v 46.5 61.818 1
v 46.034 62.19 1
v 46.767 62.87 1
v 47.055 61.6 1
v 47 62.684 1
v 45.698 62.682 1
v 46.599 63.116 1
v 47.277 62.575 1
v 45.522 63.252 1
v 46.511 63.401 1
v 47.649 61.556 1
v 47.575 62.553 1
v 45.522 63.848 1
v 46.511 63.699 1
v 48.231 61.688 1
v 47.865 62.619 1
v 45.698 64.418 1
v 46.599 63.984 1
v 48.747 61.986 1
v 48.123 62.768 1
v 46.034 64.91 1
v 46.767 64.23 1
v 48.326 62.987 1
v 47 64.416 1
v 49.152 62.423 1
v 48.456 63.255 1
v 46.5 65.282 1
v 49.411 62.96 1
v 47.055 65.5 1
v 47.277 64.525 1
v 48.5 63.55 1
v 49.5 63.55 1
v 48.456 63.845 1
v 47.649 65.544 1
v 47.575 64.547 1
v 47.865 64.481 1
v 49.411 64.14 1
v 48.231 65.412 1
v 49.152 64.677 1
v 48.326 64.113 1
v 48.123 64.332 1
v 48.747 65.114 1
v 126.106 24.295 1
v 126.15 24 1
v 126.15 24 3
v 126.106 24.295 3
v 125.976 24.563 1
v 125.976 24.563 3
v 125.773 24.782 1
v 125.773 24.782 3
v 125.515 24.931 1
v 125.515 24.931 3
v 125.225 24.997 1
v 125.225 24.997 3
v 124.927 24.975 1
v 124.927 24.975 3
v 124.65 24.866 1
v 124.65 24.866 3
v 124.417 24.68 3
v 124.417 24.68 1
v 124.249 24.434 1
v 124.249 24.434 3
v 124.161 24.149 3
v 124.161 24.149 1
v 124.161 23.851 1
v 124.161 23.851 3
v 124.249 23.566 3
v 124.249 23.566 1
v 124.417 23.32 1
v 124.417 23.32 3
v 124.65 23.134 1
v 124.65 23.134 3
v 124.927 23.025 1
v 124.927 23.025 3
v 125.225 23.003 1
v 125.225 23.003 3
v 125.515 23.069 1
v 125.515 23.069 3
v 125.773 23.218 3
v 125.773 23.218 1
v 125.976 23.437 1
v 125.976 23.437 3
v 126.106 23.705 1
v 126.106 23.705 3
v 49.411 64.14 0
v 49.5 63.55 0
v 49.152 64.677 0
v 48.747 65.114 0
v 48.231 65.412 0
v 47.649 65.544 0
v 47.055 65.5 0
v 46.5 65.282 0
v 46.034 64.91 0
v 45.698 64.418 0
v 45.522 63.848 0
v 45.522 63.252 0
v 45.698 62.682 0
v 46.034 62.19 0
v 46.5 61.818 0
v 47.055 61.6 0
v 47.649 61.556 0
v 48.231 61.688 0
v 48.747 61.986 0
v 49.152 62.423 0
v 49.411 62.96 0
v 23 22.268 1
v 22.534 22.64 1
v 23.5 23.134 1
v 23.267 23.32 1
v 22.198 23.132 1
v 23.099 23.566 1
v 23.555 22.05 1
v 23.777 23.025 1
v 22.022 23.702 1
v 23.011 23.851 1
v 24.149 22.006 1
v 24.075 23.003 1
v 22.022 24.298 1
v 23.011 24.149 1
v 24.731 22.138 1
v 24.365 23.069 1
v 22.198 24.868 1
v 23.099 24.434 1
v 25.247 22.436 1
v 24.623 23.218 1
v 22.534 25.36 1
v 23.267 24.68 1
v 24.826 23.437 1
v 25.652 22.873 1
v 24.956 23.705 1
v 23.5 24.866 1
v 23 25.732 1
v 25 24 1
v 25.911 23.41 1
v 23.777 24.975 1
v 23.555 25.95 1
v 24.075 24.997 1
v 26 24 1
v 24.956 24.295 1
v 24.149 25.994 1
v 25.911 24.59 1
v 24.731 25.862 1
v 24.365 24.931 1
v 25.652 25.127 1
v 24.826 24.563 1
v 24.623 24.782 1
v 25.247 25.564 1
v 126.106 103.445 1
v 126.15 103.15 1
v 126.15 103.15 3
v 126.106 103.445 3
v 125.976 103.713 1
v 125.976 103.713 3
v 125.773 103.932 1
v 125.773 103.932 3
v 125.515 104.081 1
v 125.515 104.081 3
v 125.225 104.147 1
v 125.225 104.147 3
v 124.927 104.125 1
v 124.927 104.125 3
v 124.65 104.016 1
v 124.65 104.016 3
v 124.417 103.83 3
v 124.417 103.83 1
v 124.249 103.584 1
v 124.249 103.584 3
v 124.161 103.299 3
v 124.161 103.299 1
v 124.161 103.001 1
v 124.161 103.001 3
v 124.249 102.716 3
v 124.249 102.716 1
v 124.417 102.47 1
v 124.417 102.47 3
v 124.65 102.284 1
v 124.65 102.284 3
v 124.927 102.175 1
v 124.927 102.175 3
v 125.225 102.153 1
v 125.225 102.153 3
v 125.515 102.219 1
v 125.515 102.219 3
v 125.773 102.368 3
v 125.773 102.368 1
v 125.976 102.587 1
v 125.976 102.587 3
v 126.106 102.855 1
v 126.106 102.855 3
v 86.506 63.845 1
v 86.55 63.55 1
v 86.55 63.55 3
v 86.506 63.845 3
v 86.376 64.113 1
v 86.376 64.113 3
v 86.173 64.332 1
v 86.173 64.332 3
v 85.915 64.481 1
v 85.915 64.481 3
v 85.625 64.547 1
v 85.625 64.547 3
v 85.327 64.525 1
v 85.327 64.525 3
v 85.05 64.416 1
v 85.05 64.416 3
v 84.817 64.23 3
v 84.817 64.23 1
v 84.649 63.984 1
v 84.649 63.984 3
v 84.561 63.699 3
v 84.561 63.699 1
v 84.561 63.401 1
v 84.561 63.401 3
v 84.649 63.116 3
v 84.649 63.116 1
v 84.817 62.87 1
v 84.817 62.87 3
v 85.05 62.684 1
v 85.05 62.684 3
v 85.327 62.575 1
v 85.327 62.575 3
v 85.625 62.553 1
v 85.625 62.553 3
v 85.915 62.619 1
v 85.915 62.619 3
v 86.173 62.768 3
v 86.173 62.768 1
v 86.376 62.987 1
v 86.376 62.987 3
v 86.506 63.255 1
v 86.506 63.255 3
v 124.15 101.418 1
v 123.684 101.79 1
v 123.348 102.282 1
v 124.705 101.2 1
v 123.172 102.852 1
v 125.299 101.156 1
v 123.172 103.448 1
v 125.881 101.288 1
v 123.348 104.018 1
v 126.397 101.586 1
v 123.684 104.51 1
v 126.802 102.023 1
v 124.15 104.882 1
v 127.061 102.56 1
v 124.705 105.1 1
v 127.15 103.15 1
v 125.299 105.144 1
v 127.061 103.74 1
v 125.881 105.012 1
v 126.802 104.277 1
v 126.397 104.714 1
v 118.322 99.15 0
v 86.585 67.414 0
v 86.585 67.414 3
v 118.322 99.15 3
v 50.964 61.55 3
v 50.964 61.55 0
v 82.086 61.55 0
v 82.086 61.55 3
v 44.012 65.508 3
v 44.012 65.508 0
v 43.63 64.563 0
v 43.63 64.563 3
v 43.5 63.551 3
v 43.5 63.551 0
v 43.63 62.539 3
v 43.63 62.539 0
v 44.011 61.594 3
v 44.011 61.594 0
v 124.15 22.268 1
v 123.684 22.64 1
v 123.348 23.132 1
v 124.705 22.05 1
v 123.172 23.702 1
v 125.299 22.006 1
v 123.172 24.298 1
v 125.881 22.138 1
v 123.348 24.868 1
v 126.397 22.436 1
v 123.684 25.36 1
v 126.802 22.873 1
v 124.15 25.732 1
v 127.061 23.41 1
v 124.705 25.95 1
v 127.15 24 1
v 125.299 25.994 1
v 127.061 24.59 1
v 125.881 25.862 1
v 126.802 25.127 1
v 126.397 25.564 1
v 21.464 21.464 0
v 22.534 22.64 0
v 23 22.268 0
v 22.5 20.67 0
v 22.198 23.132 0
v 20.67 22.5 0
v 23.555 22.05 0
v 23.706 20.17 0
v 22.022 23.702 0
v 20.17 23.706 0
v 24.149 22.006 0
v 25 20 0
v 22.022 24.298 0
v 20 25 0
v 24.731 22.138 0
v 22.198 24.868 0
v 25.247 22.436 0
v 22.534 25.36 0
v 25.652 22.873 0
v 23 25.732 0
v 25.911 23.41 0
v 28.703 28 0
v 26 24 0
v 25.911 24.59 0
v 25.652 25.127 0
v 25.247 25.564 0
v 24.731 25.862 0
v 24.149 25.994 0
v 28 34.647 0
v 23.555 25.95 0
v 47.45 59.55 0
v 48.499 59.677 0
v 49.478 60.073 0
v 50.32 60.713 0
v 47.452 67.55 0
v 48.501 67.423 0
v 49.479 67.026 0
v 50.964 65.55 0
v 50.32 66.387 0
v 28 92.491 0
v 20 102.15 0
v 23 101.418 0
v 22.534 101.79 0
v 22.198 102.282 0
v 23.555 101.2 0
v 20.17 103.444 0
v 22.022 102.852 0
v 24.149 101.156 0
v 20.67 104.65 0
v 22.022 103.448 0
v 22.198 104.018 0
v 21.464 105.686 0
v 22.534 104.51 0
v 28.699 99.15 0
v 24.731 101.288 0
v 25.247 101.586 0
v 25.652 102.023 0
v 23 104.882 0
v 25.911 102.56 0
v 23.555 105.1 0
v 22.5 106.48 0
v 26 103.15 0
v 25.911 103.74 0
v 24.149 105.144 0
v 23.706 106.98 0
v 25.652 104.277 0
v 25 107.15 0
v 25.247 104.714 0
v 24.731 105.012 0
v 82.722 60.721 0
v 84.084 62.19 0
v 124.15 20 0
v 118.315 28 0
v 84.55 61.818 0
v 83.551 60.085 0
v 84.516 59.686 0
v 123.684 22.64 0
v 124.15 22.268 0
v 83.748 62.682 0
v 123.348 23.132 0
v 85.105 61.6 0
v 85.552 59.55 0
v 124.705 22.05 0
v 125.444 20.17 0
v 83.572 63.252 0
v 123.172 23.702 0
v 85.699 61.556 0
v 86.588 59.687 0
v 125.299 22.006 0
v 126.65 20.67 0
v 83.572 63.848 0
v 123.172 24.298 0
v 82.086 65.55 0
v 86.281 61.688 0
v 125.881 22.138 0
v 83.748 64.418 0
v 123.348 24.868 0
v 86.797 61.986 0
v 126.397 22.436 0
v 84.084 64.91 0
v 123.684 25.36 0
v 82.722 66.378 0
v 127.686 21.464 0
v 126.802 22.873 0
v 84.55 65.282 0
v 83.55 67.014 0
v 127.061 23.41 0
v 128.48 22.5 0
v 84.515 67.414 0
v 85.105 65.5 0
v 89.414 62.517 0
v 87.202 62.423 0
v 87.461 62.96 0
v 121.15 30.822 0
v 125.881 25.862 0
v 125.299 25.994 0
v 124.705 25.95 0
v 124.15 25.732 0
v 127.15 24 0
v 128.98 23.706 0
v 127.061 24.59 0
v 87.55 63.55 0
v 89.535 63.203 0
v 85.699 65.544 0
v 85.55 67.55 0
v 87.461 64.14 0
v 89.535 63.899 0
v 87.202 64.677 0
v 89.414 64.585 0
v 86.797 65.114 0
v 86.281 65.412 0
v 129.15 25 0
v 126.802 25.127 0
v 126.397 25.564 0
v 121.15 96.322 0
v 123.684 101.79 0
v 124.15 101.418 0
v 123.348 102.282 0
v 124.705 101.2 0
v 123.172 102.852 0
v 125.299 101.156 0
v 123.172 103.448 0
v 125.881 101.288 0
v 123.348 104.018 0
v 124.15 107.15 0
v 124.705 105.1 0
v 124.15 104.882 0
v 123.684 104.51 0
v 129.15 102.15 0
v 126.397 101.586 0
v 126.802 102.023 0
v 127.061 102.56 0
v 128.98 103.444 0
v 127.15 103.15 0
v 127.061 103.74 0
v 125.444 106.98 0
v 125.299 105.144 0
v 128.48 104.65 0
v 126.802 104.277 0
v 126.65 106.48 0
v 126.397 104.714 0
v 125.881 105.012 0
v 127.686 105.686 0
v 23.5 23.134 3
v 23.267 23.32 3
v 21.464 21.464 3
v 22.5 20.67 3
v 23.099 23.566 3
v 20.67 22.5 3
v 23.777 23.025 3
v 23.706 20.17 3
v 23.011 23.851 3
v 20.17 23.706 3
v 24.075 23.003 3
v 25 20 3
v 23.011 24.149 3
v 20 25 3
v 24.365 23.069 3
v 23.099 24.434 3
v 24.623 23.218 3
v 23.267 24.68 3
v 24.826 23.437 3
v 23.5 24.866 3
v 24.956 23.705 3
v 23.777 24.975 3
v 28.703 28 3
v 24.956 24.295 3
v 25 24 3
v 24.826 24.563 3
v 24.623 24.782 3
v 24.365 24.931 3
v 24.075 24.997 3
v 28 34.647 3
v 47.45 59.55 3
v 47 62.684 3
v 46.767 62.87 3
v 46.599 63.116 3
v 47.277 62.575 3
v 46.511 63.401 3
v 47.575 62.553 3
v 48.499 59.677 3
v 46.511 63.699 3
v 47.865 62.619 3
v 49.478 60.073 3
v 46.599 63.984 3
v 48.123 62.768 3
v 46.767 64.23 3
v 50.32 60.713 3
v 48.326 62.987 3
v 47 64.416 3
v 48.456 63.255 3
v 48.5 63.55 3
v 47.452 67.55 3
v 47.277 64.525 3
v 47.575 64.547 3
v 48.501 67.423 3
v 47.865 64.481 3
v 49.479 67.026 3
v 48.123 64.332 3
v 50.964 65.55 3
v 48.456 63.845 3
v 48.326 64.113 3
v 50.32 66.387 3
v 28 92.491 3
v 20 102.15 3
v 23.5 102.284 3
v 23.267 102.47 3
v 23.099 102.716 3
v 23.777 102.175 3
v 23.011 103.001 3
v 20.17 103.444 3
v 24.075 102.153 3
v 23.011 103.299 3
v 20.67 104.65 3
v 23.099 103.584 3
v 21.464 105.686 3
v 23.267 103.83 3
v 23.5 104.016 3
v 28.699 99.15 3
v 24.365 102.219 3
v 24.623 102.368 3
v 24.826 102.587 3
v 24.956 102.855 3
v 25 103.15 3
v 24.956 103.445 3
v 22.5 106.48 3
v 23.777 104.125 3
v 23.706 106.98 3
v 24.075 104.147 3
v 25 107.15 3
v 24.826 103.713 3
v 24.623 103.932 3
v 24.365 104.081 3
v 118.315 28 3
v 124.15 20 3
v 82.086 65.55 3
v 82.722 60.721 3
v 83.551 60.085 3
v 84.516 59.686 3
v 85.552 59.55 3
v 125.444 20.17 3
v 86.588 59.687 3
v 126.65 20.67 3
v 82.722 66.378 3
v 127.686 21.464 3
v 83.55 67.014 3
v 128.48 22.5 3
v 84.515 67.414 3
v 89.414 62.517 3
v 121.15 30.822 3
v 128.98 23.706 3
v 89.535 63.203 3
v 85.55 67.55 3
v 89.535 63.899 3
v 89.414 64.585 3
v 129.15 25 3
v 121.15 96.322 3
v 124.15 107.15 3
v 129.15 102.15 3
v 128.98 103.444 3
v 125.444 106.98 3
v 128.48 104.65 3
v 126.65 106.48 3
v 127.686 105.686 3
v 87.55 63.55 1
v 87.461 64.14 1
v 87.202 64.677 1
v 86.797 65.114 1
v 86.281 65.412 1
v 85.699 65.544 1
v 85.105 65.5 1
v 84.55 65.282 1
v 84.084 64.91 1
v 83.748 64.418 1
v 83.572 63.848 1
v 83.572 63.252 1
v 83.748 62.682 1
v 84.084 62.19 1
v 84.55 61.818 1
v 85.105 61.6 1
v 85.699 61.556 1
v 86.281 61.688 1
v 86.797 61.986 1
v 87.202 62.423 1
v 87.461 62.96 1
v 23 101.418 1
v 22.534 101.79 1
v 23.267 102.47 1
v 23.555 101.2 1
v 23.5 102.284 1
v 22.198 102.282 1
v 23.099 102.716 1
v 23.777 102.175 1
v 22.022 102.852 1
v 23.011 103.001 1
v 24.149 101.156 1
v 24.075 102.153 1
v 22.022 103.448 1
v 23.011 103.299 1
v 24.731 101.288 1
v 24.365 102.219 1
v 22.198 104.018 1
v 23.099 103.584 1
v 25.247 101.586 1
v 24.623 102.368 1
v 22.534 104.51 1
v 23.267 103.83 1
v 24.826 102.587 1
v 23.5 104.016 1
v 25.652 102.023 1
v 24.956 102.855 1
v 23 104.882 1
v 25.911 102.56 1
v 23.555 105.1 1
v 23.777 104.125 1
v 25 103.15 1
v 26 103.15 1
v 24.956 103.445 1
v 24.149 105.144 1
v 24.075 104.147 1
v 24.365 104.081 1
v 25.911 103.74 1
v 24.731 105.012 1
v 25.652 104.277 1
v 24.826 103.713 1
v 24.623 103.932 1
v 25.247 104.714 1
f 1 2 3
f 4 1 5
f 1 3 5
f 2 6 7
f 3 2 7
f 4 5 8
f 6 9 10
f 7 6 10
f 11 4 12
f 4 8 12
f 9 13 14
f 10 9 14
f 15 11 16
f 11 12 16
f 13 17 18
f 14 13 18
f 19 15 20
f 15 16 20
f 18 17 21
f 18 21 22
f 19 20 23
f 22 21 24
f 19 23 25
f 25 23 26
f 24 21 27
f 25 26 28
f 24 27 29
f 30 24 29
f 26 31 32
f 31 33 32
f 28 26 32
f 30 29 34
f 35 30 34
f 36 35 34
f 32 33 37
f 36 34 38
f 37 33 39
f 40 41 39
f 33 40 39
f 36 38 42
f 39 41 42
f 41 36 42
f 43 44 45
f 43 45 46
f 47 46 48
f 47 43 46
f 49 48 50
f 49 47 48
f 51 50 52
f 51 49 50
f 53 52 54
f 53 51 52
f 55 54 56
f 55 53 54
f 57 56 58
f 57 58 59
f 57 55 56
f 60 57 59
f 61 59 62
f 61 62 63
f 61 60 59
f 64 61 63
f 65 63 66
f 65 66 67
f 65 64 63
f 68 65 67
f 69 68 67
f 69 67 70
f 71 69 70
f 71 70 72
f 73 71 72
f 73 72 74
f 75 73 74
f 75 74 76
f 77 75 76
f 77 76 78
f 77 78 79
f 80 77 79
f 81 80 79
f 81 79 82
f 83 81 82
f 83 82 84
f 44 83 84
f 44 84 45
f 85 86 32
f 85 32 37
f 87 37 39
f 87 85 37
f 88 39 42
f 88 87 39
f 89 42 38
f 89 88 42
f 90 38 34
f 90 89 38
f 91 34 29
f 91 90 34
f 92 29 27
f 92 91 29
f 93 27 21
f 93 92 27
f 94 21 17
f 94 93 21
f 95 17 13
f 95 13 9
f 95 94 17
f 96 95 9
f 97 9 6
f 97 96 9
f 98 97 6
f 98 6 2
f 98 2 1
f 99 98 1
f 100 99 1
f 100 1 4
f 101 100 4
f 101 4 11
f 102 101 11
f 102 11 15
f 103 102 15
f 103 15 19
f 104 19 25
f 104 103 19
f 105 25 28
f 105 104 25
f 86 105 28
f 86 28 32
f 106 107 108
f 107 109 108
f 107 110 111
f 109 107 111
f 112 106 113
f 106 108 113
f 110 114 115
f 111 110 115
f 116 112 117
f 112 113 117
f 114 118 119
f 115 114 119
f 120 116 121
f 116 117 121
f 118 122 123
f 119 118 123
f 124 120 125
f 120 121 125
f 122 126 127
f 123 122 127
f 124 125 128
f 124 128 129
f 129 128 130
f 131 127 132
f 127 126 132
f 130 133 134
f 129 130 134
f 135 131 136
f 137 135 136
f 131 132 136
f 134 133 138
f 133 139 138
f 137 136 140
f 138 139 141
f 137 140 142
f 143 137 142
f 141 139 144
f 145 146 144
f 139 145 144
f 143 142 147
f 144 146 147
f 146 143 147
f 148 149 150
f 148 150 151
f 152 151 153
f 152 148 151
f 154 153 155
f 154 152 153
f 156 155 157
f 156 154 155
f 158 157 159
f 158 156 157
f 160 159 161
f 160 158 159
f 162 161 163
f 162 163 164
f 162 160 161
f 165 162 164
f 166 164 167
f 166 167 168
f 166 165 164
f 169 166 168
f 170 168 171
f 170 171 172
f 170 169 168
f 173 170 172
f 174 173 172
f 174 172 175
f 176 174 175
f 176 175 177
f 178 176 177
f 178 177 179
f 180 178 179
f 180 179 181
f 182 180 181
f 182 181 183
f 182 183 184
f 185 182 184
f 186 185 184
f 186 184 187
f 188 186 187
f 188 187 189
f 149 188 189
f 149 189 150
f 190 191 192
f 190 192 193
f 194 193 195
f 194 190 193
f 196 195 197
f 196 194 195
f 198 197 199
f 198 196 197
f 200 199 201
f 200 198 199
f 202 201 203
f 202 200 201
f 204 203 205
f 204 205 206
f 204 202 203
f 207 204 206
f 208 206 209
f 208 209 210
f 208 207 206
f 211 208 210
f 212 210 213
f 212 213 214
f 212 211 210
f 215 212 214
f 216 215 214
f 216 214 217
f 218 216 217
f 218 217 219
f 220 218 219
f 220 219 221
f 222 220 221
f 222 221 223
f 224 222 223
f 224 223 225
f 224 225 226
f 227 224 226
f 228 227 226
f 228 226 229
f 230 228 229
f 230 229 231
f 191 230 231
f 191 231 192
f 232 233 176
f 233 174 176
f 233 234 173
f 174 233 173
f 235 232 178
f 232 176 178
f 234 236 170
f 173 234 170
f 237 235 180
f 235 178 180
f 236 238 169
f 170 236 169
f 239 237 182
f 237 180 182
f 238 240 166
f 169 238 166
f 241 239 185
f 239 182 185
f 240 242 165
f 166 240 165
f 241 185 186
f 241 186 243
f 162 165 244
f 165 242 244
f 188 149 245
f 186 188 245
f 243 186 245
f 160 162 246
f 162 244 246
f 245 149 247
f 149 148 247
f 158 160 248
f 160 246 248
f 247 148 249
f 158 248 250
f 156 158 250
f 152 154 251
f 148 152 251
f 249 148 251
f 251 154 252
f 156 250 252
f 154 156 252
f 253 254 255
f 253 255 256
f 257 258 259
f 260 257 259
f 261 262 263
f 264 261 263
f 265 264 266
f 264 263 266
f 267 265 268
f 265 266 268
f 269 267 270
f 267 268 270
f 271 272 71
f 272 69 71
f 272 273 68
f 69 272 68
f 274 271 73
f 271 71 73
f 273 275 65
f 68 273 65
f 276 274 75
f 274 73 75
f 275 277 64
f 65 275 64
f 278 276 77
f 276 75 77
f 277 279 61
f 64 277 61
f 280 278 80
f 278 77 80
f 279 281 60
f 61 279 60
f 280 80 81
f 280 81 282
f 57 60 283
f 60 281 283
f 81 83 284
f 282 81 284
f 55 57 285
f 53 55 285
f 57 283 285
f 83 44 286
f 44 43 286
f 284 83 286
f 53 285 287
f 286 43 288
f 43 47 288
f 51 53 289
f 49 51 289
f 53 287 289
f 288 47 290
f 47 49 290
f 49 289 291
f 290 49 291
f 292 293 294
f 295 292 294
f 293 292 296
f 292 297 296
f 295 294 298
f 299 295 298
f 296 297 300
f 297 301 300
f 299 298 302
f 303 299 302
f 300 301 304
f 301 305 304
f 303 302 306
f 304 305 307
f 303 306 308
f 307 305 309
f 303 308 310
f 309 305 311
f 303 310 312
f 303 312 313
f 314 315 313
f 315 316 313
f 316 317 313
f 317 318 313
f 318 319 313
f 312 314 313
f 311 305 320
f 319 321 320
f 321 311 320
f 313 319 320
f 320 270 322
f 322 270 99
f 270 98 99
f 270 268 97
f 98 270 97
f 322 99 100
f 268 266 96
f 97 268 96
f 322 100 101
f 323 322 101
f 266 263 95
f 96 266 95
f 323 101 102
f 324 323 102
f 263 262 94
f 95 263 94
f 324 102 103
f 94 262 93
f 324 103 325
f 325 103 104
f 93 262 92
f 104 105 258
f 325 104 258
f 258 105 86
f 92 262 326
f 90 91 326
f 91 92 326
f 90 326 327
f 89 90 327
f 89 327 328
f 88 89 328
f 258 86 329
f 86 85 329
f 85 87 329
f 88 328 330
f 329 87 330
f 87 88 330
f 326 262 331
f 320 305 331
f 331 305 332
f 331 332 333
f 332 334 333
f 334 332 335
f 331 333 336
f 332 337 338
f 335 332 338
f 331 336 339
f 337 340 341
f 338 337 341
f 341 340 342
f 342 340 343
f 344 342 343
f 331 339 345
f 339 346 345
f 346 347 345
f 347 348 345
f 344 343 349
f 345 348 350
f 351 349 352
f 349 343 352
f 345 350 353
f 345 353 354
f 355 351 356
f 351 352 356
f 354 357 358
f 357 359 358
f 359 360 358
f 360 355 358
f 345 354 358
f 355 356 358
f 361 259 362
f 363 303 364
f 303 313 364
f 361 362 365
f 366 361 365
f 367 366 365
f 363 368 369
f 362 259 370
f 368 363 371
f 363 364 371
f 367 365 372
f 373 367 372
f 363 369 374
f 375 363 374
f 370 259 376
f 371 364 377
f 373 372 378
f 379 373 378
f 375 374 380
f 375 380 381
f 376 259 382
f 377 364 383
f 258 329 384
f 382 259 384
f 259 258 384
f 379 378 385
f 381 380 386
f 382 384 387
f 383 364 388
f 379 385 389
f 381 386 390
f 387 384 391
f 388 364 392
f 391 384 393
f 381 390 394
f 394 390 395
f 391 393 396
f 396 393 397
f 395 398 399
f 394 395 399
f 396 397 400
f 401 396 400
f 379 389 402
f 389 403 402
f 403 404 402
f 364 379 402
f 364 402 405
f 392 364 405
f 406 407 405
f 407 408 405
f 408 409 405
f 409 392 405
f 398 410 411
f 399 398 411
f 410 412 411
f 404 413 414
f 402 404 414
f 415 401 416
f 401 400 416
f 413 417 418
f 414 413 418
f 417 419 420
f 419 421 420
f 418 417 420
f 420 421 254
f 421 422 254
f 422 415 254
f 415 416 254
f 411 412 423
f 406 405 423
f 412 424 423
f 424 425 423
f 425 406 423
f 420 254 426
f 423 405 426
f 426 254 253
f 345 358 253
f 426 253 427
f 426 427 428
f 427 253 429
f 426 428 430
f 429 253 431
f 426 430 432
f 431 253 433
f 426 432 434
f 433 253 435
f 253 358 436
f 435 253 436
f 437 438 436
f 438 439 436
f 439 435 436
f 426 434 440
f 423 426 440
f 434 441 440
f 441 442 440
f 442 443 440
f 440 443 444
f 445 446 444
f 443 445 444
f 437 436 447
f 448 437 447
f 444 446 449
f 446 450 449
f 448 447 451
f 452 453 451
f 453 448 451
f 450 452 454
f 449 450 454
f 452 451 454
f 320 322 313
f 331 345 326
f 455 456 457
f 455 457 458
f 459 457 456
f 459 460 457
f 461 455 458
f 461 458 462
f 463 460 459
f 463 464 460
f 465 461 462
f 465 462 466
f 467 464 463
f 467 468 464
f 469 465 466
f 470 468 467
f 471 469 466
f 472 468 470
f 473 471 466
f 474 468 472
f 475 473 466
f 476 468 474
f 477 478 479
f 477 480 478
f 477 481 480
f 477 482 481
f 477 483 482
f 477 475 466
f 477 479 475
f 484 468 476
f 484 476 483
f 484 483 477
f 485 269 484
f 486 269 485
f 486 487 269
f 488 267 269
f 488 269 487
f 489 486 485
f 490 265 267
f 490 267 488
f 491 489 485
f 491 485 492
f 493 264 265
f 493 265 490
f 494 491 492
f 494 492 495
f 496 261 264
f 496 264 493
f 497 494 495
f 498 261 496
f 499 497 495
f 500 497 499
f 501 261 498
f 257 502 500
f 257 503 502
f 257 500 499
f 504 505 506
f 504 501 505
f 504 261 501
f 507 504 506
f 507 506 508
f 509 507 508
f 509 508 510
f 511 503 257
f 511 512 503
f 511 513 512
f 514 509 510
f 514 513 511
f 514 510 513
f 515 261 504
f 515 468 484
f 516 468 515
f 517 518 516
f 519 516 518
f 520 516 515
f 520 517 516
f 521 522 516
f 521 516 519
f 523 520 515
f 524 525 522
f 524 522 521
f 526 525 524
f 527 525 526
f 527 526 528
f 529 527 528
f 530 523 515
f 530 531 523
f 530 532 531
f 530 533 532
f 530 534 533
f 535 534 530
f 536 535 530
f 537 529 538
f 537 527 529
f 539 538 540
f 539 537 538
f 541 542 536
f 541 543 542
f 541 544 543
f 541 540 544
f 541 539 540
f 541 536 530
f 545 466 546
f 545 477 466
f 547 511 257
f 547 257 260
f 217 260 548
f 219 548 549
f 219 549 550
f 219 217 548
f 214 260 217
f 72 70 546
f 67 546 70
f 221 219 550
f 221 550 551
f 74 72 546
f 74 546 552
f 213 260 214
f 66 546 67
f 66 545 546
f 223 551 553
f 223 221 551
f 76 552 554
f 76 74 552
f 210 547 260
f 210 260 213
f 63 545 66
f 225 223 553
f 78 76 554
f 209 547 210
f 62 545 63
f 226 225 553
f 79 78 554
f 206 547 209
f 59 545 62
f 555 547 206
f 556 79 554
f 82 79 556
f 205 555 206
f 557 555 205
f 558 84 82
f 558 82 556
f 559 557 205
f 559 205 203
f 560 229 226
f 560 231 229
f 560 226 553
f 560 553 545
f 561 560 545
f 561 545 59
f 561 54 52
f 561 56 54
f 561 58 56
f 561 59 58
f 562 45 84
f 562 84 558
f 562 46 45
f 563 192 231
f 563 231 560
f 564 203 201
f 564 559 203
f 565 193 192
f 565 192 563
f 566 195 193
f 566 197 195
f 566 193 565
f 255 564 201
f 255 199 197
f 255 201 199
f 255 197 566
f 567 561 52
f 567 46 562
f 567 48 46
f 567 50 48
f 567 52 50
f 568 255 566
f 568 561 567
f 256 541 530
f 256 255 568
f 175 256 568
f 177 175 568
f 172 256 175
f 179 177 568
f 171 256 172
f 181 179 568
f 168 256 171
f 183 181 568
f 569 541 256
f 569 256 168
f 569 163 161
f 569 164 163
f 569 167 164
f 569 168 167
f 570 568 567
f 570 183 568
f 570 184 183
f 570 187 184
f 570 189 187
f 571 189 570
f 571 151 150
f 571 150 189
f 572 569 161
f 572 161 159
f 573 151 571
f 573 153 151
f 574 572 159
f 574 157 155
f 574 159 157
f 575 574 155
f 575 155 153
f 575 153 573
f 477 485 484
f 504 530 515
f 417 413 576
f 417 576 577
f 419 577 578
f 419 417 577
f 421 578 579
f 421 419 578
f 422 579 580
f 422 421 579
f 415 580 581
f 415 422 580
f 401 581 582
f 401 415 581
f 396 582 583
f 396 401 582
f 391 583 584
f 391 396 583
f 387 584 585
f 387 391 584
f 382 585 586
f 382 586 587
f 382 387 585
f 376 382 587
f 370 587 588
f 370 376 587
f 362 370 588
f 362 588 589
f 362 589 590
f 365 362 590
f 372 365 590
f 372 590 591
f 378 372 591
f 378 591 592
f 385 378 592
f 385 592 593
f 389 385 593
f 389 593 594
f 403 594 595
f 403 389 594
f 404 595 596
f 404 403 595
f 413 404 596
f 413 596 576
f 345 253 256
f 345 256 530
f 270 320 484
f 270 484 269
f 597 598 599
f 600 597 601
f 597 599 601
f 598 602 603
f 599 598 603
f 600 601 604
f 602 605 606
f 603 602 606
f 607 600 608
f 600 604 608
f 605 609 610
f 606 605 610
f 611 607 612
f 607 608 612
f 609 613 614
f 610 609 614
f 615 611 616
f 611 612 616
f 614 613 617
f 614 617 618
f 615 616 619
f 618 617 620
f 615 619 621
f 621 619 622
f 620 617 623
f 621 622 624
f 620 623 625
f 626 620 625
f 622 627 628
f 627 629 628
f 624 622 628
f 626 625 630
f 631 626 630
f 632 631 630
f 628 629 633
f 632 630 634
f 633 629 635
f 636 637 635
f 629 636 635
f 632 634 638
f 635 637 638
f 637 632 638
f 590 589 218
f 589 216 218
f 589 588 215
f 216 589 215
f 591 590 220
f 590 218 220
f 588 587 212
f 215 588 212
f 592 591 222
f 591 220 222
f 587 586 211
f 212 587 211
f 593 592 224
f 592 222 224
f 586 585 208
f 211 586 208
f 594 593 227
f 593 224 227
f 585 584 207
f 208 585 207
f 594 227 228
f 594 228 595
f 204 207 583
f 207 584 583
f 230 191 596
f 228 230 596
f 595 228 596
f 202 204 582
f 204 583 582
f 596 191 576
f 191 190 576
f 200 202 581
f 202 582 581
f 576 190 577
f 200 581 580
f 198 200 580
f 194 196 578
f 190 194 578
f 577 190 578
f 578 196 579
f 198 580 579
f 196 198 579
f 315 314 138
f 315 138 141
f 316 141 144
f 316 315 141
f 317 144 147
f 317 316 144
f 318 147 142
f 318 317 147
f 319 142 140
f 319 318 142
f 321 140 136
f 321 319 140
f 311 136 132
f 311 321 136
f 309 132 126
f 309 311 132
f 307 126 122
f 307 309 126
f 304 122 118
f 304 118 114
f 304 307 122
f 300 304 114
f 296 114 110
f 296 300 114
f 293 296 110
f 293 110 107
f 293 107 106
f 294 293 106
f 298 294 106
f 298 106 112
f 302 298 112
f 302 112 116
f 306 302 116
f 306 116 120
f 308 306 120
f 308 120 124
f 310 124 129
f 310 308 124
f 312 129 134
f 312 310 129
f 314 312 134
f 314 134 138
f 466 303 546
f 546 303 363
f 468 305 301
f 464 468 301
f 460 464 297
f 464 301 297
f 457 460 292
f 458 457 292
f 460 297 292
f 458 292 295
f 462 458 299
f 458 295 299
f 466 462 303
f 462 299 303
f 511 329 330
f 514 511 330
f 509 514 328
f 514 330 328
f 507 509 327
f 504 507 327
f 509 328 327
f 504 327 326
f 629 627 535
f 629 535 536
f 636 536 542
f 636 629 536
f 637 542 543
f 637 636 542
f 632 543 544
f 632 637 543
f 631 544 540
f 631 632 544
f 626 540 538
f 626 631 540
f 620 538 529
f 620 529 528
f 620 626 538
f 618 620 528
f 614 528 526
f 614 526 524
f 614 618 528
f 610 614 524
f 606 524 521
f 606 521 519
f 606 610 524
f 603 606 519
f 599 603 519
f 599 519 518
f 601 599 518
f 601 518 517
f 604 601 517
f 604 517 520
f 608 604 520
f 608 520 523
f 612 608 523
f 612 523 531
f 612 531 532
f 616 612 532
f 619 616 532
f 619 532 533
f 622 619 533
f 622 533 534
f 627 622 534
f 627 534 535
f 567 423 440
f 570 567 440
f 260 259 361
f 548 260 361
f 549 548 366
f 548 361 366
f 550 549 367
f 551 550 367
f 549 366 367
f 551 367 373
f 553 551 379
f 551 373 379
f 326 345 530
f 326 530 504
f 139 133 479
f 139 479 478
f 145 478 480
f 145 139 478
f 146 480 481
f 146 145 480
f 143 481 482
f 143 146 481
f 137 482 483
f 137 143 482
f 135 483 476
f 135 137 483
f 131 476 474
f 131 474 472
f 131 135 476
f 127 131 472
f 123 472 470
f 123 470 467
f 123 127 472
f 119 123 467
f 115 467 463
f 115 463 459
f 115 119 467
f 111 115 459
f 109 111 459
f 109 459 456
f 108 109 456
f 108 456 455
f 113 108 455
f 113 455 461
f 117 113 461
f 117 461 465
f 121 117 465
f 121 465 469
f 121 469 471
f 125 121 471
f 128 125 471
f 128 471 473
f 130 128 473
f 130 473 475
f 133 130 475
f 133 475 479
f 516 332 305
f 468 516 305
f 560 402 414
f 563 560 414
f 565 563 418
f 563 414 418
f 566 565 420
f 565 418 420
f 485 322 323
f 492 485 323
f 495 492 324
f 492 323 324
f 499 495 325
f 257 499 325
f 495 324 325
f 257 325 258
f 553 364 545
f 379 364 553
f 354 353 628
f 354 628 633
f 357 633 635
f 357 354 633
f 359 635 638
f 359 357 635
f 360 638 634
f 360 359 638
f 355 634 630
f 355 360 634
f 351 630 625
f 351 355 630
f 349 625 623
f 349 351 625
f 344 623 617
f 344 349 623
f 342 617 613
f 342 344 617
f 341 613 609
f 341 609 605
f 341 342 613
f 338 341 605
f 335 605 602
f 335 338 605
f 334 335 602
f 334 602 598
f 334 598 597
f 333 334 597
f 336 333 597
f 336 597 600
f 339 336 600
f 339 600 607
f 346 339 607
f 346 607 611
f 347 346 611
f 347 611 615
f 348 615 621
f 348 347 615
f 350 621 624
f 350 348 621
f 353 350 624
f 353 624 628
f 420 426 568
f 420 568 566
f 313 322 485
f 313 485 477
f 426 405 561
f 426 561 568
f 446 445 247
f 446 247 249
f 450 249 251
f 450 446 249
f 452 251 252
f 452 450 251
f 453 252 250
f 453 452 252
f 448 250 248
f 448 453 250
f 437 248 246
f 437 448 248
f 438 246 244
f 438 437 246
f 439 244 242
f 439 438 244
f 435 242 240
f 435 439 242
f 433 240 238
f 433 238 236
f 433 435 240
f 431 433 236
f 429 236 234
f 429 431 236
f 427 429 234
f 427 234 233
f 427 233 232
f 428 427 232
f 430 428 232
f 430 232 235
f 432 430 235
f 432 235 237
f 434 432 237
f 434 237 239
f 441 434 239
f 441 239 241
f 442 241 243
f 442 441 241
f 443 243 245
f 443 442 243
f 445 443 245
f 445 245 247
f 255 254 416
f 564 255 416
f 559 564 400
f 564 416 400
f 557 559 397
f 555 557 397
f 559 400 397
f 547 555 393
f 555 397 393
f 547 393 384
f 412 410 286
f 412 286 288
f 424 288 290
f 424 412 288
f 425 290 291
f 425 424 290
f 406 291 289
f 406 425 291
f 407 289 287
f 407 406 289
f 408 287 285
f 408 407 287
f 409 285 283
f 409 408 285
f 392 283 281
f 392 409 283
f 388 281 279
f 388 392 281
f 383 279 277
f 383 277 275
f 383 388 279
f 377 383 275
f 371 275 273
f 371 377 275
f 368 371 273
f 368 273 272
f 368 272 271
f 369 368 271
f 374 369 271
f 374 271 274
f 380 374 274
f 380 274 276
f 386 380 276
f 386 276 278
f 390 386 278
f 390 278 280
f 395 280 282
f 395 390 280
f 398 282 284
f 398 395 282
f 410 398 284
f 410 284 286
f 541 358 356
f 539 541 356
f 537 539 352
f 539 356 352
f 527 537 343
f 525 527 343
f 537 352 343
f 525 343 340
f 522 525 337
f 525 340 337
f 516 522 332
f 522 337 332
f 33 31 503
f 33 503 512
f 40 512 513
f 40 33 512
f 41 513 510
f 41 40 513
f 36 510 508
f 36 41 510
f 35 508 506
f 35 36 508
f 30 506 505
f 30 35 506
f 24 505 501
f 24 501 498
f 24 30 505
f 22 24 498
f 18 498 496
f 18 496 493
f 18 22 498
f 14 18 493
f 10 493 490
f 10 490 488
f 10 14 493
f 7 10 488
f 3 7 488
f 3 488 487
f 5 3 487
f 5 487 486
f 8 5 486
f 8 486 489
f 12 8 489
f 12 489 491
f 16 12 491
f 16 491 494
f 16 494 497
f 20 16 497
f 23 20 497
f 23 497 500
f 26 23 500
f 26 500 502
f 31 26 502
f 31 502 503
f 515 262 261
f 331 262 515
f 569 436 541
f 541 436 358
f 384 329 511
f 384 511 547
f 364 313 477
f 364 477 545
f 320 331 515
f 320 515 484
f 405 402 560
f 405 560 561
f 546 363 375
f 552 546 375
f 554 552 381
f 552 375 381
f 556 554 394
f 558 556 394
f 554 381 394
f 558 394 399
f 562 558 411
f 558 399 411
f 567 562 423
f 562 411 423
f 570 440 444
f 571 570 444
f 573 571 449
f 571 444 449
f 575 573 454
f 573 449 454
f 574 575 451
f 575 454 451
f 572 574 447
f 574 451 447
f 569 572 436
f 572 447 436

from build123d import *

# Parameters (mm, degrees)
SKETCH002_R     = 1
PAD001_DEPTH    = 3
SKETCH003_R     = 2
POCKET001_DEPTH = 1


with BuildPart() as part:
    # Sketch002 → Pad001 (new body)
    with BuildSketch(Plane.XY):
        with BuildLine():
            Line((129.15, 25), (129.15, 102.15))
            ThreePointArc((129.15, 102.15), (127.685534, 105.685534), (124.15, 107.15))
            Line((124.15, 107.15), (25, 107.15))
            ThreePointArc((25, 107.15), (21.464466, 105.685534), (20, 102.15))
            Line((20, 102.15), (20, 25))
            ThreePointArc((20, 25), (21.464466, 21.464466), (25, 20))
            Line((25, 20), (124.15, 20))
            ThreePointArc((124.15, 20), (127.685534, 21.464466), (129.15, 25))
        make_face()
        with Locations((24, 103.15)):
            Circle(SKETCH002_R, mode=Mode.SUBTRACT)
        with Locations((24, 24)):
            Circle(SKETCH002_R, mode=Mode.SUBTRACT)
        with Locations((125.15, 24)):
            Circle(SKETCH002_R, mode=Mode.SUBTRACT)
        with Locations((125.15, 103.15)):
            Circle(SKETCH002_R, mode=Mode.SUBTRACT)
        with Locations((85.55, 63.55)):
            Circle(SKETCH002_R, mode=Mode.SUBTRACT)
        with Locations((47.5, 63.55)):
            Circle(SKETCH002_R, mode=Mode.SUBTRACT)
        with BuildLine():
            ThreePointArc((50.964102, 65.55), (49.479216, 67.026018), (47.452085, 67.549713))
            Line((28.699389, 99.15), (47.452085, 67.549713))
            Line((118.321573, 99.15), (28.699389, 99.15))
            Line((86.585276, 67.413703), (118.321573, 99.15))
            ThreePointArc((86.585276, 67.413703), (84.019266, 67.245518), (82.085898, 65.55))
            Line((50.964102, 65.55), (82.085898, 65.55))
        make_face(mode=Mode.SUBTRACT)
        with BuildLine():
            ThreePointArc((82.085898, 61.55), (84.020434, 59.853999), (86.587717, 59.686951))
            Line((118.314728, 28), (86.587717, 59.686951))
            Line((28.703156, 28), (118.314728, 28))
            Line((47.449866, 59.550314), (28.703156, 28))
            ThreePointArc((47.449866, 59.550314), (49.478252, 60.073433), (50.964102, 61.55))
            Line((50.964102, 61.55), (82.085898, 61.55))
        make_face(mode=Mode.SUBTRACT)
        with BuildLine():
            Line((89.414357, 62.517165), (121.15, 30.821592))
            Line((121.15, 30.821592), (121.15, 96.321573))
            Line((121.15, 96.321573), (89.413703, 64.585276))
            ThreePointArc((89.414357, 62.517165), (89.55, 63.551263), (89.413703, 64.585276))
        make_face(mode=Mode.SUBTRACT)
        with BuildLine():
            Line((44.012189, 65.508361), (28, 92.490603))
            Line((28, 92.490603), (28, 34.647227))
            Line((28, 34.647227), (44.011104, 61.593574))
            ThreePointArc((44.012189, 65.508361), (43.5, 63.551109), (44.011104, 61.593574))
        make_face(mode=Mode.SUBTRACT)
    extrude(amount=PAD001_DEPTH)

    # Sketch003 → Pocket001 (cut)
    with BuildSketch(Plane.XY):
        with Locations((24, 103.15)):
            Circle(SKETCH003_R)
        with Locations((24, 24)):
            Circle(SKETCH003_R)
        with Locations((125.15, 24)):
            Circle(SKETCH003_R)
        with Locations((125.15, 103.15)):
            Circle(SKETCH003_R)
        with Locations((85.55, 63.55)):
            Circle(SKETCH003_R)
        with Locations((47.5, 63.55)):
            Circle(SKETCH003_R)
    extrude(amount=POCKET001_DEPTH, mode=Mode.SUBTRACT)


solid = part.part
